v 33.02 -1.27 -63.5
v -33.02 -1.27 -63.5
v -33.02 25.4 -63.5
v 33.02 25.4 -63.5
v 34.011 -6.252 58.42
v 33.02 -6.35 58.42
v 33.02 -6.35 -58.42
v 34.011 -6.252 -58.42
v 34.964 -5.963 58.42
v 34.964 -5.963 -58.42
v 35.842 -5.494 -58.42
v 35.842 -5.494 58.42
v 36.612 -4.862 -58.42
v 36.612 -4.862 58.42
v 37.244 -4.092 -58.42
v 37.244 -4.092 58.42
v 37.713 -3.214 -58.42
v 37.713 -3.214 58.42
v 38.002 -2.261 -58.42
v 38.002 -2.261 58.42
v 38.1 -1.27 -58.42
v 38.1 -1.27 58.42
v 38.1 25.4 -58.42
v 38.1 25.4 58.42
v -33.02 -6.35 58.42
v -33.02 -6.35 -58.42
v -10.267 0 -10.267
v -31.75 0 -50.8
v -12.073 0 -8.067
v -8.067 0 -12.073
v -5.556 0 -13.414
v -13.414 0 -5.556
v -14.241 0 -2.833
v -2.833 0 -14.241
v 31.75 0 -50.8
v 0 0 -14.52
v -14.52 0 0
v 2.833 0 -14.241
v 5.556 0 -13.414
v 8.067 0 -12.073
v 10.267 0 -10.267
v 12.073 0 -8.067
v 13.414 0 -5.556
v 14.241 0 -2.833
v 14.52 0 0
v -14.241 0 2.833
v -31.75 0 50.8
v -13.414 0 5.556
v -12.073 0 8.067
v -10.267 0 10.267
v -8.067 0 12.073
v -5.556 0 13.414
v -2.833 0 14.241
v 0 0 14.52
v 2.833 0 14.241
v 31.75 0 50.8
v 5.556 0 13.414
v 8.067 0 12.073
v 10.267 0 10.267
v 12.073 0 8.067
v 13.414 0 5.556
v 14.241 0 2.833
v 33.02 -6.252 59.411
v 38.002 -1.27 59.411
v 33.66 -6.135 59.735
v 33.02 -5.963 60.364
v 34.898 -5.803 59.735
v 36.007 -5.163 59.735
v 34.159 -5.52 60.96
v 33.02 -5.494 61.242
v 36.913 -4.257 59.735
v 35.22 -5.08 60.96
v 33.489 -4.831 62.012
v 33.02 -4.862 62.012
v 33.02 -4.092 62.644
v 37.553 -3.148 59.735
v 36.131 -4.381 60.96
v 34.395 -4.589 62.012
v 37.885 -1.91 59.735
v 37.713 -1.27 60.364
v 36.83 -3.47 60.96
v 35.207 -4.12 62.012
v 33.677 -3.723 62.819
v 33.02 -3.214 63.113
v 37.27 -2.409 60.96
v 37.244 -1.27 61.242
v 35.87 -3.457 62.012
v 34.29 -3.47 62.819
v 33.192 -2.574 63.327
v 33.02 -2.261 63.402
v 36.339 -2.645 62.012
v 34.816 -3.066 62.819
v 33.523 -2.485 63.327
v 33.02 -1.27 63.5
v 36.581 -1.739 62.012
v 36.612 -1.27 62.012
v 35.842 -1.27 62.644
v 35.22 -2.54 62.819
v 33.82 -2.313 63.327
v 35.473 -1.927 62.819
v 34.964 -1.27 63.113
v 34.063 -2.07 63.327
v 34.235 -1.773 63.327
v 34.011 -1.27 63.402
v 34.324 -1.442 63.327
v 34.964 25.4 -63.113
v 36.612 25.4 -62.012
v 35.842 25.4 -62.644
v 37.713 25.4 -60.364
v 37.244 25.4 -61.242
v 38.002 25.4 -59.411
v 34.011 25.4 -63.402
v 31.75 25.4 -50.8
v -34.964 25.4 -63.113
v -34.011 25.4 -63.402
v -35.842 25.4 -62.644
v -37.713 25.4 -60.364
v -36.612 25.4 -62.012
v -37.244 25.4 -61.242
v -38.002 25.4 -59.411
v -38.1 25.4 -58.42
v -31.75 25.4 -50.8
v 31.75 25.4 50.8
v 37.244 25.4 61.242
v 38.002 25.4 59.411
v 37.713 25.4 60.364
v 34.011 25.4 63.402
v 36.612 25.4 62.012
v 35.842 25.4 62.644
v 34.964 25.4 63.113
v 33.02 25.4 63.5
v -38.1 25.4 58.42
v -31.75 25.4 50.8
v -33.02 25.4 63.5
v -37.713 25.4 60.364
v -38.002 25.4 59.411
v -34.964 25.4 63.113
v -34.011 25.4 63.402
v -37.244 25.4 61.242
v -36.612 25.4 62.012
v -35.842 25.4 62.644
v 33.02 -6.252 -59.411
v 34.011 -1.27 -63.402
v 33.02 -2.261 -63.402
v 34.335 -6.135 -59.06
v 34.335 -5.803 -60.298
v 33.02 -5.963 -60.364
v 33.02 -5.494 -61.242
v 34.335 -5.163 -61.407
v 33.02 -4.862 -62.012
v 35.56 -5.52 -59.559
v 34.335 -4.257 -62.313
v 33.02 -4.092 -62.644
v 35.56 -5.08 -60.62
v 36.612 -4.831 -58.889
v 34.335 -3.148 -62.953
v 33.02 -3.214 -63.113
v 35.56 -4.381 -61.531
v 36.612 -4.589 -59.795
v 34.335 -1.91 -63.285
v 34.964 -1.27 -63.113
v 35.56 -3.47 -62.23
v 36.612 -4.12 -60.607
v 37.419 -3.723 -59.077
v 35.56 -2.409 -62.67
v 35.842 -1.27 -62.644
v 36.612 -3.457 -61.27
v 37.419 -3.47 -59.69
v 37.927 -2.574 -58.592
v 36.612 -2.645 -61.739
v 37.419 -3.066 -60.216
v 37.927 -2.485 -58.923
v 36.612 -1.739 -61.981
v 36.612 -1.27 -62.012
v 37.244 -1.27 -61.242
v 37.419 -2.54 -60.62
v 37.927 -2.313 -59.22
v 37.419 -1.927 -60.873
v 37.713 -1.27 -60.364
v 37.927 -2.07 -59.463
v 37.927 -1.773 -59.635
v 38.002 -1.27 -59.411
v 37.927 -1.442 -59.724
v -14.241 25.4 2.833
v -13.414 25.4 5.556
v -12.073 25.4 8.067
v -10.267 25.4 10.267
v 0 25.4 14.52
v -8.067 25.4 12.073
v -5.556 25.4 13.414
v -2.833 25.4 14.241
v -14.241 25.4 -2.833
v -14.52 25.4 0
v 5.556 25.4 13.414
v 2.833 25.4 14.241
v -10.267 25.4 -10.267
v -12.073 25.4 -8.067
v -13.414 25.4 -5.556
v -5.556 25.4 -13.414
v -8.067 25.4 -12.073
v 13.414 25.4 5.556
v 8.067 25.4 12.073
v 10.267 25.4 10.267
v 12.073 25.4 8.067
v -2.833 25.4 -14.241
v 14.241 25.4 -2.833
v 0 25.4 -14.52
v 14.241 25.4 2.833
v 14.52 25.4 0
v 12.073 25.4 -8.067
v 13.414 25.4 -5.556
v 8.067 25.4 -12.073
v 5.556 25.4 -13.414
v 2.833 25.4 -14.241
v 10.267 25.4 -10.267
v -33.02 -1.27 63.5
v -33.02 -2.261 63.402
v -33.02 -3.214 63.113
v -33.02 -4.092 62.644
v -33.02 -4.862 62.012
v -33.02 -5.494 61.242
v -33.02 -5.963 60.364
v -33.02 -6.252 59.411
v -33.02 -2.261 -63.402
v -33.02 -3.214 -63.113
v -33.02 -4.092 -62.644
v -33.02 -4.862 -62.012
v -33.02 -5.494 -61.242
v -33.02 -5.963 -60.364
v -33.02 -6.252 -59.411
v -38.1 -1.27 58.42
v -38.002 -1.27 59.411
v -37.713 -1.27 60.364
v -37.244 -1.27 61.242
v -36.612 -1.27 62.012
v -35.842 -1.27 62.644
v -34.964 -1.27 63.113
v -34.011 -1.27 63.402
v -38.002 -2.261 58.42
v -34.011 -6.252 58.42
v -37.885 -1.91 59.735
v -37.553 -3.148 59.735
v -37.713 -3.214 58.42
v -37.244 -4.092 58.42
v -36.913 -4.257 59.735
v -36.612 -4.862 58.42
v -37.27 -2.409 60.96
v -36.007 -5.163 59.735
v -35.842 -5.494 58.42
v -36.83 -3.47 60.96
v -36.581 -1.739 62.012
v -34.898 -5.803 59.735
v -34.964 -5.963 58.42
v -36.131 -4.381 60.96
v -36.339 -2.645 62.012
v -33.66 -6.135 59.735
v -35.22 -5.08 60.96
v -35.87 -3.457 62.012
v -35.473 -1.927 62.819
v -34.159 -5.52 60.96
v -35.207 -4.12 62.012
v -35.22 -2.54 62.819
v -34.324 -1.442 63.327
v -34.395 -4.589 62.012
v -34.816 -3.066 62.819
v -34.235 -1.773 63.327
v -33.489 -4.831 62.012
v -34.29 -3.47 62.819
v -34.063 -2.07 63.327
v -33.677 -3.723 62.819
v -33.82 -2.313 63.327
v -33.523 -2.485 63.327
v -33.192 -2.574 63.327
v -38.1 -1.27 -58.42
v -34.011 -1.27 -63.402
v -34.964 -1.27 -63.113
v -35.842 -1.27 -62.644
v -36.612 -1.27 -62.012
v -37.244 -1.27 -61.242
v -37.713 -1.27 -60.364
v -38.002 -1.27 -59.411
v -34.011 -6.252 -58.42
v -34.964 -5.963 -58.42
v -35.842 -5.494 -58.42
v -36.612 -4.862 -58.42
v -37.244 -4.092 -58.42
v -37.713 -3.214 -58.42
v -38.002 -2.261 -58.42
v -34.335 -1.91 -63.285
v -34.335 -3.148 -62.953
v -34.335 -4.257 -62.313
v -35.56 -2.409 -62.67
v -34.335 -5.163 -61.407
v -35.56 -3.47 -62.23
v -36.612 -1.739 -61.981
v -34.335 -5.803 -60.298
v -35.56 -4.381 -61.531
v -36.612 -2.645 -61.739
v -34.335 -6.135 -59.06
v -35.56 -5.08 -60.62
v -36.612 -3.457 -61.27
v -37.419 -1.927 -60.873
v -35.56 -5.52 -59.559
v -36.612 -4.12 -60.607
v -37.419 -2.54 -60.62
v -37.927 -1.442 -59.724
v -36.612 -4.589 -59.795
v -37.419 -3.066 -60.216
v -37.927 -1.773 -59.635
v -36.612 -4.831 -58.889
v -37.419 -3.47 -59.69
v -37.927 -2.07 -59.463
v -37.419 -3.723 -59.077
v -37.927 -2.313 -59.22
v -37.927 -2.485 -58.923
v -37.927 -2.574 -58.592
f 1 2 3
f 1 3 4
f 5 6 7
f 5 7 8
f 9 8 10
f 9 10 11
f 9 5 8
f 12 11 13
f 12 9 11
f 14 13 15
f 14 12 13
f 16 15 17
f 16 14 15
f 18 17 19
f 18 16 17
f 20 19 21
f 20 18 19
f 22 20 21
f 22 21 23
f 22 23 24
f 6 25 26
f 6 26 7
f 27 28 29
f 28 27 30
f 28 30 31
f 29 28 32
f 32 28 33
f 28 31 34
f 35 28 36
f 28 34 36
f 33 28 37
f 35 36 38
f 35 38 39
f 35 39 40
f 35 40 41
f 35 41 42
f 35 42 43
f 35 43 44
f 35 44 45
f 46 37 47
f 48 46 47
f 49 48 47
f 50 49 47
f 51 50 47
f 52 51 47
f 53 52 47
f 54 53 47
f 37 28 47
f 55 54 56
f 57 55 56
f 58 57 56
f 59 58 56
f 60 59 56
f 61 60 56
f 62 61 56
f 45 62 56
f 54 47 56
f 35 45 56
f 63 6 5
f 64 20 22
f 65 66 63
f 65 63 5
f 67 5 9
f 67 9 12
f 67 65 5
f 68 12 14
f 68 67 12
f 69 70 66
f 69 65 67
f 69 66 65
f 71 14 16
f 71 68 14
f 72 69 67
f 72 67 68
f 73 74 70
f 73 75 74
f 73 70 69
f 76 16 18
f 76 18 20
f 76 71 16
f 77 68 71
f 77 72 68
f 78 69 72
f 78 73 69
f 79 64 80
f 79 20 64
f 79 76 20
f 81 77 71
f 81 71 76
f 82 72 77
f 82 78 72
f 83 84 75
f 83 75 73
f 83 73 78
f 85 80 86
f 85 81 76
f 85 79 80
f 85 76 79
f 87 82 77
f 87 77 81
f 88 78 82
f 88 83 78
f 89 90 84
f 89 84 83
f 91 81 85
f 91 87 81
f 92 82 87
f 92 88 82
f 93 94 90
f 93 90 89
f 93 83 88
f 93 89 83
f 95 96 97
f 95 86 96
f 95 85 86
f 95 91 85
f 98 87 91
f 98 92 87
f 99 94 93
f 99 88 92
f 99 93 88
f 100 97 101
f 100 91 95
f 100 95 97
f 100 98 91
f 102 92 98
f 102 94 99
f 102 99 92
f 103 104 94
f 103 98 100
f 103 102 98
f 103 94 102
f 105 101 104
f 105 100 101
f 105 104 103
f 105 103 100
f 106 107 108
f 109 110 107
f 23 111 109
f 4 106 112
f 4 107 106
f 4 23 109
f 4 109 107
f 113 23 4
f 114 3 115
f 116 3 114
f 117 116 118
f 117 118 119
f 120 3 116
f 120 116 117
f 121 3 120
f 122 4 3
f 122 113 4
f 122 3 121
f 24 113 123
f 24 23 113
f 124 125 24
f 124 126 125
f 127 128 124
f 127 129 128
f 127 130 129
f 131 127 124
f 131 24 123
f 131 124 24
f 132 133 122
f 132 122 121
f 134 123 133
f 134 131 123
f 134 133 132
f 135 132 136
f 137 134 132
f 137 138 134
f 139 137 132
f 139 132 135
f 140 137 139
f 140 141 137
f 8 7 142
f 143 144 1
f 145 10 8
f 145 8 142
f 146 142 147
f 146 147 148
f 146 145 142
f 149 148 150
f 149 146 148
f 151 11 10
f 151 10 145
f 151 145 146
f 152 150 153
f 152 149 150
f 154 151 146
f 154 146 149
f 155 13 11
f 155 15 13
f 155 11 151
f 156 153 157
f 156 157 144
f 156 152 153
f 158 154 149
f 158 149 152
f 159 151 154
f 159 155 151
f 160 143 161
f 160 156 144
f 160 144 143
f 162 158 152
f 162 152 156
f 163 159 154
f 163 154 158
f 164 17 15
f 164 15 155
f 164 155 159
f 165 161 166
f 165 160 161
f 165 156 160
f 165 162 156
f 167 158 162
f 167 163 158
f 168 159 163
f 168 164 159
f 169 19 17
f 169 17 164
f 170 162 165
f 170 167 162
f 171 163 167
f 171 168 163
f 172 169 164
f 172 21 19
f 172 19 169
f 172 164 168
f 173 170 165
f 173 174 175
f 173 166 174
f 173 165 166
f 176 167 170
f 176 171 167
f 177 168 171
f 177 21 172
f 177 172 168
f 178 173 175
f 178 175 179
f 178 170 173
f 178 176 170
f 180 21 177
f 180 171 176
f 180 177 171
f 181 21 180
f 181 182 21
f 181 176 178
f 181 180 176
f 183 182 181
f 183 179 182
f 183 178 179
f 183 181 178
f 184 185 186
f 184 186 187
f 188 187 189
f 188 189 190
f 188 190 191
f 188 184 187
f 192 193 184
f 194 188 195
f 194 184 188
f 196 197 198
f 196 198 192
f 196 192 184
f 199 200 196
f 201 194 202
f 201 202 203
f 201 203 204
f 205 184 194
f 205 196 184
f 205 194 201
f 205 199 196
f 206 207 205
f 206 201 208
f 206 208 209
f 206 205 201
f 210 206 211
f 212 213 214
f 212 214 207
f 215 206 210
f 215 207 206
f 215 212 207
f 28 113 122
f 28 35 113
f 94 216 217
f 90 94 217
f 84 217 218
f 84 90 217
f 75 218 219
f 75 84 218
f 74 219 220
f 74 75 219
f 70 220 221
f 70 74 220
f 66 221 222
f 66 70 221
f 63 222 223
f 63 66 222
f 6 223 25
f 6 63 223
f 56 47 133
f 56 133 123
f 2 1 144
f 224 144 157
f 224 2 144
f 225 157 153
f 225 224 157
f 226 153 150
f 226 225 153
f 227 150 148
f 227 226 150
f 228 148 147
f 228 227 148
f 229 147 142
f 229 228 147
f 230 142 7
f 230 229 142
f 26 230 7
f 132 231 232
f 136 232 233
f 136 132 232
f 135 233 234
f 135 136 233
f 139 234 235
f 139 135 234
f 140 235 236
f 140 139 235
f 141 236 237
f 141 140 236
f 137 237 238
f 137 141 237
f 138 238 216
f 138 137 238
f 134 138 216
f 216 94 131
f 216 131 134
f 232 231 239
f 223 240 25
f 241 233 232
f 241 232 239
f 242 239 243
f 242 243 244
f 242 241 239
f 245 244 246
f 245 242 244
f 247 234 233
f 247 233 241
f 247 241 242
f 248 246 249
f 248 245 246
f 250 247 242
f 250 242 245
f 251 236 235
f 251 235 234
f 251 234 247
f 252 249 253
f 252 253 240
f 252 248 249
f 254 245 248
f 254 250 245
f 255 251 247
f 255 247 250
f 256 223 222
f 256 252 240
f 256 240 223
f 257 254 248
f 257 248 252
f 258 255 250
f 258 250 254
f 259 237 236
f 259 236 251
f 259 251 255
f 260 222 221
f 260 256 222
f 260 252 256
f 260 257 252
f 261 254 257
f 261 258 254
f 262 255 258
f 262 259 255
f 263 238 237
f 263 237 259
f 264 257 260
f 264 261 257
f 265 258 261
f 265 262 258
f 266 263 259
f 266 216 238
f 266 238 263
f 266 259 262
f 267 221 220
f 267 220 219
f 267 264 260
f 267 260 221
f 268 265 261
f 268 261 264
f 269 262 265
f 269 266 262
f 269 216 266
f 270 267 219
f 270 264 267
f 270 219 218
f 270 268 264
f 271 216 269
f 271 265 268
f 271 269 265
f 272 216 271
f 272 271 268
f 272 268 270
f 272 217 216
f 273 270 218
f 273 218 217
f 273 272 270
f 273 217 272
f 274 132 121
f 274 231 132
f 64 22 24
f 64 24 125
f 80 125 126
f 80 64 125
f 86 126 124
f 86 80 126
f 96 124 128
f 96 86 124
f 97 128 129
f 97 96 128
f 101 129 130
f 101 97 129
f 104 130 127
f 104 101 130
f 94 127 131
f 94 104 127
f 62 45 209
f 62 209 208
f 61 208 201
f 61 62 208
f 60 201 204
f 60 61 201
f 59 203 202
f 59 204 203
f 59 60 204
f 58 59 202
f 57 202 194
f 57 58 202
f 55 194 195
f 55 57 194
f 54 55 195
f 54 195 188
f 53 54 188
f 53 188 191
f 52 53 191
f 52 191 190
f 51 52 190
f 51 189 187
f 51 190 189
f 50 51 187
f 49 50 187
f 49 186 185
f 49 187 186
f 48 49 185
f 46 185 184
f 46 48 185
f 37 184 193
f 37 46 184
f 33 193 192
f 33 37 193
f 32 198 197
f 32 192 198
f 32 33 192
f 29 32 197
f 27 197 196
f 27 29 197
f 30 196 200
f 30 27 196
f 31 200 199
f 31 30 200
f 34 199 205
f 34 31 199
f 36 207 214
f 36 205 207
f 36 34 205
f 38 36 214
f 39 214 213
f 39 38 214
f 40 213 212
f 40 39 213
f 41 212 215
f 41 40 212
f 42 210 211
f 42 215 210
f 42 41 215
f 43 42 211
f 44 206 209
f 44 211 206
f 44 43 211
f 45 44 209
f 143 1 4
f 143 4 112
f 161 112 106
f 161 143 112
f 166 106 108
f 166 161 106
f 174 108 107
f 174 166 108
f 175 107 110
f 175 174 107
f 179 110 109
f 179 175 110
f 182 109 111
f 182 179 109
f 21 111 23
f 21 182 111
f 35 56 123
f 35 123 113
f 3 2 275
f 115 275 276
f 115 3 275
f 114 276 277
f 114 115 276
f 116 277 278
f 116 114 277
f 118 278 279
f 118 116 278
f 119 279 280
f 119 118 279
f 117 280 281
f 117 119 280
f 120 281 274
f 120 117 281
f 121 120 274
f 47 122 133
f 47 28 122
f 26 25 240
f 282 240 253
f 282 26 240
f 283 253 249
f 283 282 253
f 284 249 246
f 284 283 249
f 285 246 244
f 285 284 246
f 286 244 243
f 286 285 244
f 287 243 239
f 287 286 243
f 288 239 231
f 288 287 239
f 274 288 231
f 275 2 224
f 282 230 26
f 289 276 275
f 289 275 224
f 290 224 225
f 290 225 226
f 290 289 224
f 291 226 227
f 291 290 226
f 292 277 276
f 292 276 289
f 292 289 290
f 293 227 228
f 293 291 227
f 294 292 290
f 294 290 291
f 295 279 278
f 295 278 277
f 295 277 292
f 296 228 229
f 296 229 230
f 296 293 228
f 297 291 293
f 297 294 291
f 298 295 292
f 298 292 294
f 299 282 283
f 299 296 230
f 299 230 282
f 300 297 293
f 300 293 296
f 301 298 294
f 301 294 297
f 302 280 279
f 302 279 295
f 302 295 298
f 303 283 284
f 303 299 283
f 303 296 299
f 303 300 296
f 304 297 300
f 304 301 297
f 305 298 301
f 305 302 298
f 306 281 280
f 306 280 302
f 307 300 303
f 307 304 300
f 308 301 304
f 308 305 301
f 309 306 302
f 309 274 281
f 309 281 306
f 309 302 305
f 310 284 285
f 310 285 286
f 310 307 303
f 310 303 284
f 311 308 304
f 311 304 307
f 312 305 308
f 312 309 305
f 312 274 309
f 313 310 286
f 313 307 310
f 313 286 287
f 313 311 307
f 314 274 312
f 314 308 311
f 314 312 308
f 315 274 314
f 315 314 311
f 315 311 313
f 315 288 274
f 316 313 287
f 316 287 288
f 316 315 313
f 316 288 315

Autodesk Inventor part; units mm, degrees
ref_plane "YZ Plane" through (0, 0, 0) normal (1, 0, 0) x (0, 1, 0)
ref_plane "XZ Plane" through (0, 0, 0) normal (0, 1, 0) x (-1, 0, 0)
ref_plane "XY Plane" through (0, 0, 0) normal (0, 0, 1) x (1, 0, 0)
sketch "Sketch1" plane through (0, 0, 0) normal (0, 1, 0) x (-1, 0, 0)
  line L0 (-38.1, 63.5) -> (38.1, 63.5)
  line L1 (38.1, 63.5) -> (38.1, -63.5)
  line L2 (38.1, -63.5) -> (-38.1, -63.5)
  line L3 (-38.1, -63.5) -> (-38.1, 63.5)
  line L4 (-38.1, 63.5) -> (38.1, -63.5) construction
  line L5 (38.1, 63.5) -> (-38.1, -63.5) construction
  line L6 (-31.75, -50.8) -> (31.75, -50.8)
  line L7 (31.75, -50.8) -> (31.75, 50.8)
  line L8 (31.75, 50.8) -> (-31.75, 50.8)
  line L9 (-31.75, 50.8) -> (-31.75, -50.8)
  line L10 (-31.75, -50.8) -> (31.75, 50.8) construction
  line L11 (31.75, -50.8) -> (-31.75, 50.8) construction
  point P0 (0, 0)
  dimension "d0" = 76.2
  dimension "d1" = 127
  dimension "d2" = 63.5
  dimension "d3" = 101.6
extrude "Extrusion1" add sketch "Sketch1" along normal blind 25.4
sketch "Sketch2" plane through (0, 0, 0) normal (0, -1, 0) x (1, 0, 0)
  line L0 (-38.1, 63.5) -> (38.1, 63.5) projected
  line L1 (38.1, -63.5) -> (-38.1, -63.5) projected
  line L2 (38.1, 63.5) -> (-38.1, 63.5)
  line L3 (-38.1, 63.5) -> (-38.1, -63.5)
  line L4 (-38.1, -63.5) -> (38.1, -63.5)
  line L5 (38.1, -63.5) -> (38.1, 63.5)
  point P0 (0, 0)
extrude "Extrusion2" add sketch "Sketch2" along normal blind 6.35
fillet "Fillet1" radius 5.08 4 edges at (38.1, -6.35, 0) (0, -6.35, -63.5) (-38.1, -6.35, 0) (0, -6.35, 63.5)
fillet "Fillet2" radius 5.08 8 edges at (36.6121, -4.8621, -62.0121) (38.1, 12.065, -63.5) (-36.6121, -4.8621, -62.0121) (-38.1, 12.065, -63.5) (36.6121, -4.8621, 62.0121) (38.1, 12.065, 63.5) (-36.6121, -4.8621, 62.0121) (-38.1, 12.065, 63.5)
sketch "Sketch3" plane through (0, 0, 0) normal (0, 1, 0) x (1, 0, 0)
  circle A0 centre (0, 0) radius 14.5196
extrude "Extrusion3" add sketch "Sketch3" along normal up to surface (25.4 mm away)
properties part number "TestPart"
